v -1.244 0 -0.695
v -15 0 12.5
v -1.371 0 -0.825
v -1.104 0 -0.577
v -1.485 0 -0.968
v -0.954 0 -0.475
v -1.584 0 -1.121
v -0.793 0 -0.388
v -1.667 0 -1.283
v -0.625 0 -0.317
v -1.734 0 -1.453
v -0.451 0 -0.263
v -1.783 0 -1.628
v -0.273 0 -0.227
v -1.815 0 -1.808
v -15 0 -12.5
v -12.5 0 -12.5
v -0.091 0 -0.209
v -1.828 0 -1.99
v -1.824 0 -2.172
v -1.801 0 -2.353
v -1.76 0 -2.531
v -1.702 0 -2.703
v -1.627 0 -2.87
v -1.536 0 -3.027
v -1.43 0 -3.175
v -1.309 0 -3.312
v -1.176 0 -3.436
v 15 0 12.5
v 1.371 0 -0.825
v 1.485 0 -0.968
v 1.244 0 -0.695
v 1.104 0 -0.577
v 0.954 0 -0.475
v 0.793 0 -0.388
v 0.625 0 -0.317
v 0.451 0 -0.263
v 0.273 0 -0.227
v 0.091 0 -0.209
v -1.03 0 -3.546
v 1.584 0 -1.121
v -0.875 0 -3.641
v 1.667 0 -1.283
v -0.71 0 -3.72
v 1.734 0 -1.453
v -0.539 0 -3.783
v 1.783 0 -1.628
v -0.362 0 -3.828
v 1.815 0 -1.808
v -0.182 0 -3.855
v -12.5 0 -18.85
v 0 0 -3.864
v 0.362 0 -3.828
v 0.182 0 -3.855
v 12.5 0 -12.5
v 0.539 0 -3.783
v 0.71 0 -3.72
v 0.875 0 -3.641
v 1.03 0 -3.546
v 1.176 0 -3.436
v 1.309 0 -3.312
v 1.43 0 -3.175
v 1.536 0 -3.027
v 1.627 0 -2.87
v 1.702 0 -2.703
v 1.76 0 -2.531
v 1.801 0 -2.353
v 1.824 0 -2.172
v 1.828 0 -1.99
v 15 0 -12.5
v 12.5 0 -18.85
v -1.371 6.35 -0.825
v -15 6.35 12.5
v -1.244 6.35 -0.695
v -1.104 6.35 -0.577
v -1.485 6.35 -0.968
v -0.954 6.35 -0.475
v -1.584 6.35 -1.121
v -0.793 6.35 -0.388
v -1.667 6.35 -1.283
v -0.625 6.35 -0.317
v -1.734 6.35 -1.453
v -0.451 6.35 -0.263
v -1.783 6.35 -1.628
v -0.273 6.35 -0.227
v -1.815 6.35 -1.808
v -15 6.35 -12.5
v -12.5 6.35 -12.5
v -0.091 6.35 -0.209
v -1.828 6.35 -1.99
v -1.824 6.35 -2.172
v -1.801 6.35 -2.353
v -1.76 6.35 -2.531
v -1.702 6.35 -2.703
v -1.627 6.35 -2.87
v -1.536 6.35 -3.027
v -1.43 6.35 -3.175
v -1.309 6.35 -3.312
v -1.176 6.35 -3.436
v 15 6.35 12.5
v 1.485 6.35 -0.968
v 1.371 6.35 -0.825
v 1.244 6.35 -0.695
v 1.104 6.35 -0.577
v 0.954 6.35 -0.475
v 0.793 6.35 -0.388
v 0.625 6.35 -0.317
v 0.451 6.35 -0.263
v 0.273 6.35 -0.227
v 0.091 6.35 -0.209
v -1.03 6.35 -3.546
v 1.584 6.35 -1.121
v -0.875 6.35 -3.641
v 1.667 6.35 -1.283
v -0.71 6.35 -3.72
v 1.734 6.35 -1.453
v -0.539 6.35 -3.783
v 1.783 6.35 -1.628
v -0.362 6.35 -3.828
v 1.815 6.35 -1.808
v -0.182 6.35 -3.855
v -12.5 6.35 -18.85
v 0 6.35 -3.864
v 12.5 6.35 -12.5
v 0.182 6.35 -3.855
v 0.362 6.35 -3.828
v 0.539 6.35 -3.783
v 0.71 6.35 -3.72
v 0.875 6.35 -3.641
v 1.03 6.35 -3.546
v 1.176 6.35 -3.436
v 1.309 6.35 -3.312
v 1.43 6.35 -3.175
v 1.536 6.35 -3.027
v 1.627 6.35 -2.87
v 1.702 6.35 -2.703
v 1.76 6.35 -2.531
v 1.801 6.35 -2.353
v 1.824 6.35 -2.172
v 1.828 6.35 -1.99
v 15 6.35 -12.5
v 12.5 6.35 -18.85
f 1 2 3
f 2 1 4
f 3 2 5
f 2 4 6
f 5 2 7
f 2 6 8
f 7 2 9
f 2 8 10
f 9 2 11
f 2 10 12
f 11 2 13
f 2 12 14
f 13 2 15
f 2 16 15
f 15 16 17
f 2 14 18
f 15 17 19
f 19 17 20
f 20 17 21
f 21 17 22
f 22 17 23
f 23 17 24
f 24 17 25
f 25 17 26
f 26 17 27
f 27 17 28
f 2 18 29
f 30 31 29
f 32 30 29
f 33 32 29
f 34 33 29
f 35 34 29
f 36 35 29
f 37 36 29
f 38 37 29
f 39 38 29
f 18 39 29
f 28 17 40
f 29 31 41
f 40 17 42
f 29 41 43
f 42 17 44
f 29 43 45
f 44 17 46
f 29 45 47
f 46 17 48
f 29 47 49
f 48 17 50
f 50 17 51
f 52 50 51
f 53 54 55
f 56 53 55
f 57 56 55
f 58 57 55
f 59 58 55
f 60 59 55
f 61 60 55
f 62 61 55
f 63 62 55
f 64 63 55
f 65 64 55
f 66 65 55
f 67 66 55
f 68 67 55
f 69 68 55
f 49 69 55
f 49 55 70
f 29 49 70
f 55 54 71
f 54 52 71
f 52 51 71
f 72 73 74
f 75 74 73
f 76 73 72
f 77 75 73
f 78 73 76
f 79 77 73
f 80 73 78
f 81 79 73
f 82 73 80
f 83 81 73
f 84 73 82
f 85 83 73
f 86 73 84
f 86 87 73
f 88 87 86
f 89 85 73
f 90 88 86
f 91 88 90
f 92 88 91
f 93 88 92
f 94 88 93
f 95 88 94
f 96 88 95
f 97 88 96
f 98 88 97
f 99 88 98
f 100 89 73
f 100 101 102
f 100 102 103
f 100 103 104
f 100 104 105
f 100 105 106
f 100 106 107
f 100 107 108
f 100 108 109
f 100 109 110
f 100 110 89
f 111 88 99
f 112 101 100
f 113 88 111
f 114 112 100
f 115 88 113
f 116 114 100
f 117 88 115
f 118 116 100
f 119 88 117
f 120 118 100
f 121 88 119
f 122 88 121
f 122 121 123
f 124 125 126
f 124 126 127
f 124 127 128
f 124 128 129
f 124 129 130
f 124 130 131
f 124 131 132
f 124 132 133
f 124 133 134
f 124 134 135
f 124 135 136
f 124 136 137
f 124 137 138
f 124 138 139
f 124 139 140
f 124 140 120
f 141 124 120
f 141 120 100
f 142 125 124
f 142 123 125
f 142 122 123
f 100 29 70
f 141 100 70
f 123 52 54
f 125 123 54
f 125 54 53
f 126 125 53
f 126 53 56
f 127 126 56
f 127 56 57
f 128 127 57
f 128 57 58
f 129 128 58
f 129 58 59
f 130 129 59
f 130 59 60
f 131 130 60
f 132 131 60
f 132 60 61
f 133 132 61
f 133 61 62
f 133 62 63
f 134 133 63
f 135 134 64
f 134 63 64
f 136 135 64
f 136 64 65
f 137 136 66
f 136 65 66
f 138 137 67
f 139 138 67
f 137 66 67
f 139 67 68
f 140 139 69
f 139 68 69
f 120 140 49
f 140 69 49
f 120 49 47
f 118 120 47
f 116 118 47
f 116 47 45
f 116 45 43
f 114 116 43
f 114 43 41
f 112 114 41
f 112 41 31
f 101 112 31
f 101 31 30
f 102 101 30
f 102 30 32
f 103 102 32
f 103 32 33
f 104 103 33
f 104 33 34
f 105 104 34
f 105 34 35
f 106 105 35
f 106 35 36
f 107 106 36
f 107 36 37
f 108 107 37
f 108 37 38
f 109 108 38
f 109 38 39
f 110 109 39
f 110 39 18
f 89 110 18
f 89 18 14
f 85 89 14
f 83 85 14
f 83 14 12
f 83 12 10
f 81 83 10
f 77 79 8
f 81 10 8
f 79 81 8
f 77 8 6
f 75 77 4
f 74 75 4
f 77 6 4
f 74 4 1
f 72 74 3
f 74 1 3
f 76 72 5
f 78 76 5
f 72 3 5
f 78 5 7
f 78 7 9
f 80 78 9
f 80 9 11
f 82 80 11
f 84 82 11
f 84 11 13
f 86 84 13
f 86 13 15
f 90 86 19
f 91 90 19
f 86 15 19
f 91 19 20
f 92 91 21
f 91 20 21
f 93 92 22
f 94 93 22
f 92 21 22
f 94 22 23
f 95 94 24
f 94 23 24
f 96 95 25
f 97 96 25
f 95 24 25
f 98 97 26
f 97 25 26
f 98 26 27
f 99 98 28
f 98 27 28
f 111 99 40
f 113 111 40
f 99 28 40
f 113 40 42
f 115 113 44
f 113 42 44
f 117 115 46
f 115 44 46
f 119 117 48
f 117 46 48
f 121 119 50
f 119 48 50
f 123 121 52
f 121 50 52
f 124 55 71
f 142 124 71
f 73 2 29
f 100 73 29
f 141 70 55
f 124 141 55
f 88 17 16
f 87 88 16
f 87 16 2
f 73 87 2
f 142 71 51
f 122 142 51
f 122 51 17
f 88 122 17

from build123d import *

# Parameters (mm, degrees)
BOSS_EXTRUDE1_DEPTH   = 6.35
F_6_CLEARANCE_HOLE1_D = 3.6576


with BuildPart() as part:
    # Sketch1 → Boss-Extrude1 (new body)
    with BuildSketch(Plane(origin=(0, 0, 0), x_dir=(1, 0, 0), z_dir=(0, 1, 0))):
        Polygon((-12.5, 12.5), (-15, 12.5), (-15, -12.5), (15, -12.5), (15, 12.5), (12.5, 12.5), (12.5, 18.85), (-12.5, 18.85), align=None)
    extrude(amount=BOSS_EXTRUDE1_DEPTH)

    # #6 Clearance Hole1 (through all)
    with Locations(Plane(origin=(0, 6.35, -2.0352), x_dir=(0, 0, 1), z_dir=(0, 1, 0))):
        with Locations((0, 0)):
            Hole(F_6_CLEARANCE_HOLE1_D / 2)


solid = part.part
